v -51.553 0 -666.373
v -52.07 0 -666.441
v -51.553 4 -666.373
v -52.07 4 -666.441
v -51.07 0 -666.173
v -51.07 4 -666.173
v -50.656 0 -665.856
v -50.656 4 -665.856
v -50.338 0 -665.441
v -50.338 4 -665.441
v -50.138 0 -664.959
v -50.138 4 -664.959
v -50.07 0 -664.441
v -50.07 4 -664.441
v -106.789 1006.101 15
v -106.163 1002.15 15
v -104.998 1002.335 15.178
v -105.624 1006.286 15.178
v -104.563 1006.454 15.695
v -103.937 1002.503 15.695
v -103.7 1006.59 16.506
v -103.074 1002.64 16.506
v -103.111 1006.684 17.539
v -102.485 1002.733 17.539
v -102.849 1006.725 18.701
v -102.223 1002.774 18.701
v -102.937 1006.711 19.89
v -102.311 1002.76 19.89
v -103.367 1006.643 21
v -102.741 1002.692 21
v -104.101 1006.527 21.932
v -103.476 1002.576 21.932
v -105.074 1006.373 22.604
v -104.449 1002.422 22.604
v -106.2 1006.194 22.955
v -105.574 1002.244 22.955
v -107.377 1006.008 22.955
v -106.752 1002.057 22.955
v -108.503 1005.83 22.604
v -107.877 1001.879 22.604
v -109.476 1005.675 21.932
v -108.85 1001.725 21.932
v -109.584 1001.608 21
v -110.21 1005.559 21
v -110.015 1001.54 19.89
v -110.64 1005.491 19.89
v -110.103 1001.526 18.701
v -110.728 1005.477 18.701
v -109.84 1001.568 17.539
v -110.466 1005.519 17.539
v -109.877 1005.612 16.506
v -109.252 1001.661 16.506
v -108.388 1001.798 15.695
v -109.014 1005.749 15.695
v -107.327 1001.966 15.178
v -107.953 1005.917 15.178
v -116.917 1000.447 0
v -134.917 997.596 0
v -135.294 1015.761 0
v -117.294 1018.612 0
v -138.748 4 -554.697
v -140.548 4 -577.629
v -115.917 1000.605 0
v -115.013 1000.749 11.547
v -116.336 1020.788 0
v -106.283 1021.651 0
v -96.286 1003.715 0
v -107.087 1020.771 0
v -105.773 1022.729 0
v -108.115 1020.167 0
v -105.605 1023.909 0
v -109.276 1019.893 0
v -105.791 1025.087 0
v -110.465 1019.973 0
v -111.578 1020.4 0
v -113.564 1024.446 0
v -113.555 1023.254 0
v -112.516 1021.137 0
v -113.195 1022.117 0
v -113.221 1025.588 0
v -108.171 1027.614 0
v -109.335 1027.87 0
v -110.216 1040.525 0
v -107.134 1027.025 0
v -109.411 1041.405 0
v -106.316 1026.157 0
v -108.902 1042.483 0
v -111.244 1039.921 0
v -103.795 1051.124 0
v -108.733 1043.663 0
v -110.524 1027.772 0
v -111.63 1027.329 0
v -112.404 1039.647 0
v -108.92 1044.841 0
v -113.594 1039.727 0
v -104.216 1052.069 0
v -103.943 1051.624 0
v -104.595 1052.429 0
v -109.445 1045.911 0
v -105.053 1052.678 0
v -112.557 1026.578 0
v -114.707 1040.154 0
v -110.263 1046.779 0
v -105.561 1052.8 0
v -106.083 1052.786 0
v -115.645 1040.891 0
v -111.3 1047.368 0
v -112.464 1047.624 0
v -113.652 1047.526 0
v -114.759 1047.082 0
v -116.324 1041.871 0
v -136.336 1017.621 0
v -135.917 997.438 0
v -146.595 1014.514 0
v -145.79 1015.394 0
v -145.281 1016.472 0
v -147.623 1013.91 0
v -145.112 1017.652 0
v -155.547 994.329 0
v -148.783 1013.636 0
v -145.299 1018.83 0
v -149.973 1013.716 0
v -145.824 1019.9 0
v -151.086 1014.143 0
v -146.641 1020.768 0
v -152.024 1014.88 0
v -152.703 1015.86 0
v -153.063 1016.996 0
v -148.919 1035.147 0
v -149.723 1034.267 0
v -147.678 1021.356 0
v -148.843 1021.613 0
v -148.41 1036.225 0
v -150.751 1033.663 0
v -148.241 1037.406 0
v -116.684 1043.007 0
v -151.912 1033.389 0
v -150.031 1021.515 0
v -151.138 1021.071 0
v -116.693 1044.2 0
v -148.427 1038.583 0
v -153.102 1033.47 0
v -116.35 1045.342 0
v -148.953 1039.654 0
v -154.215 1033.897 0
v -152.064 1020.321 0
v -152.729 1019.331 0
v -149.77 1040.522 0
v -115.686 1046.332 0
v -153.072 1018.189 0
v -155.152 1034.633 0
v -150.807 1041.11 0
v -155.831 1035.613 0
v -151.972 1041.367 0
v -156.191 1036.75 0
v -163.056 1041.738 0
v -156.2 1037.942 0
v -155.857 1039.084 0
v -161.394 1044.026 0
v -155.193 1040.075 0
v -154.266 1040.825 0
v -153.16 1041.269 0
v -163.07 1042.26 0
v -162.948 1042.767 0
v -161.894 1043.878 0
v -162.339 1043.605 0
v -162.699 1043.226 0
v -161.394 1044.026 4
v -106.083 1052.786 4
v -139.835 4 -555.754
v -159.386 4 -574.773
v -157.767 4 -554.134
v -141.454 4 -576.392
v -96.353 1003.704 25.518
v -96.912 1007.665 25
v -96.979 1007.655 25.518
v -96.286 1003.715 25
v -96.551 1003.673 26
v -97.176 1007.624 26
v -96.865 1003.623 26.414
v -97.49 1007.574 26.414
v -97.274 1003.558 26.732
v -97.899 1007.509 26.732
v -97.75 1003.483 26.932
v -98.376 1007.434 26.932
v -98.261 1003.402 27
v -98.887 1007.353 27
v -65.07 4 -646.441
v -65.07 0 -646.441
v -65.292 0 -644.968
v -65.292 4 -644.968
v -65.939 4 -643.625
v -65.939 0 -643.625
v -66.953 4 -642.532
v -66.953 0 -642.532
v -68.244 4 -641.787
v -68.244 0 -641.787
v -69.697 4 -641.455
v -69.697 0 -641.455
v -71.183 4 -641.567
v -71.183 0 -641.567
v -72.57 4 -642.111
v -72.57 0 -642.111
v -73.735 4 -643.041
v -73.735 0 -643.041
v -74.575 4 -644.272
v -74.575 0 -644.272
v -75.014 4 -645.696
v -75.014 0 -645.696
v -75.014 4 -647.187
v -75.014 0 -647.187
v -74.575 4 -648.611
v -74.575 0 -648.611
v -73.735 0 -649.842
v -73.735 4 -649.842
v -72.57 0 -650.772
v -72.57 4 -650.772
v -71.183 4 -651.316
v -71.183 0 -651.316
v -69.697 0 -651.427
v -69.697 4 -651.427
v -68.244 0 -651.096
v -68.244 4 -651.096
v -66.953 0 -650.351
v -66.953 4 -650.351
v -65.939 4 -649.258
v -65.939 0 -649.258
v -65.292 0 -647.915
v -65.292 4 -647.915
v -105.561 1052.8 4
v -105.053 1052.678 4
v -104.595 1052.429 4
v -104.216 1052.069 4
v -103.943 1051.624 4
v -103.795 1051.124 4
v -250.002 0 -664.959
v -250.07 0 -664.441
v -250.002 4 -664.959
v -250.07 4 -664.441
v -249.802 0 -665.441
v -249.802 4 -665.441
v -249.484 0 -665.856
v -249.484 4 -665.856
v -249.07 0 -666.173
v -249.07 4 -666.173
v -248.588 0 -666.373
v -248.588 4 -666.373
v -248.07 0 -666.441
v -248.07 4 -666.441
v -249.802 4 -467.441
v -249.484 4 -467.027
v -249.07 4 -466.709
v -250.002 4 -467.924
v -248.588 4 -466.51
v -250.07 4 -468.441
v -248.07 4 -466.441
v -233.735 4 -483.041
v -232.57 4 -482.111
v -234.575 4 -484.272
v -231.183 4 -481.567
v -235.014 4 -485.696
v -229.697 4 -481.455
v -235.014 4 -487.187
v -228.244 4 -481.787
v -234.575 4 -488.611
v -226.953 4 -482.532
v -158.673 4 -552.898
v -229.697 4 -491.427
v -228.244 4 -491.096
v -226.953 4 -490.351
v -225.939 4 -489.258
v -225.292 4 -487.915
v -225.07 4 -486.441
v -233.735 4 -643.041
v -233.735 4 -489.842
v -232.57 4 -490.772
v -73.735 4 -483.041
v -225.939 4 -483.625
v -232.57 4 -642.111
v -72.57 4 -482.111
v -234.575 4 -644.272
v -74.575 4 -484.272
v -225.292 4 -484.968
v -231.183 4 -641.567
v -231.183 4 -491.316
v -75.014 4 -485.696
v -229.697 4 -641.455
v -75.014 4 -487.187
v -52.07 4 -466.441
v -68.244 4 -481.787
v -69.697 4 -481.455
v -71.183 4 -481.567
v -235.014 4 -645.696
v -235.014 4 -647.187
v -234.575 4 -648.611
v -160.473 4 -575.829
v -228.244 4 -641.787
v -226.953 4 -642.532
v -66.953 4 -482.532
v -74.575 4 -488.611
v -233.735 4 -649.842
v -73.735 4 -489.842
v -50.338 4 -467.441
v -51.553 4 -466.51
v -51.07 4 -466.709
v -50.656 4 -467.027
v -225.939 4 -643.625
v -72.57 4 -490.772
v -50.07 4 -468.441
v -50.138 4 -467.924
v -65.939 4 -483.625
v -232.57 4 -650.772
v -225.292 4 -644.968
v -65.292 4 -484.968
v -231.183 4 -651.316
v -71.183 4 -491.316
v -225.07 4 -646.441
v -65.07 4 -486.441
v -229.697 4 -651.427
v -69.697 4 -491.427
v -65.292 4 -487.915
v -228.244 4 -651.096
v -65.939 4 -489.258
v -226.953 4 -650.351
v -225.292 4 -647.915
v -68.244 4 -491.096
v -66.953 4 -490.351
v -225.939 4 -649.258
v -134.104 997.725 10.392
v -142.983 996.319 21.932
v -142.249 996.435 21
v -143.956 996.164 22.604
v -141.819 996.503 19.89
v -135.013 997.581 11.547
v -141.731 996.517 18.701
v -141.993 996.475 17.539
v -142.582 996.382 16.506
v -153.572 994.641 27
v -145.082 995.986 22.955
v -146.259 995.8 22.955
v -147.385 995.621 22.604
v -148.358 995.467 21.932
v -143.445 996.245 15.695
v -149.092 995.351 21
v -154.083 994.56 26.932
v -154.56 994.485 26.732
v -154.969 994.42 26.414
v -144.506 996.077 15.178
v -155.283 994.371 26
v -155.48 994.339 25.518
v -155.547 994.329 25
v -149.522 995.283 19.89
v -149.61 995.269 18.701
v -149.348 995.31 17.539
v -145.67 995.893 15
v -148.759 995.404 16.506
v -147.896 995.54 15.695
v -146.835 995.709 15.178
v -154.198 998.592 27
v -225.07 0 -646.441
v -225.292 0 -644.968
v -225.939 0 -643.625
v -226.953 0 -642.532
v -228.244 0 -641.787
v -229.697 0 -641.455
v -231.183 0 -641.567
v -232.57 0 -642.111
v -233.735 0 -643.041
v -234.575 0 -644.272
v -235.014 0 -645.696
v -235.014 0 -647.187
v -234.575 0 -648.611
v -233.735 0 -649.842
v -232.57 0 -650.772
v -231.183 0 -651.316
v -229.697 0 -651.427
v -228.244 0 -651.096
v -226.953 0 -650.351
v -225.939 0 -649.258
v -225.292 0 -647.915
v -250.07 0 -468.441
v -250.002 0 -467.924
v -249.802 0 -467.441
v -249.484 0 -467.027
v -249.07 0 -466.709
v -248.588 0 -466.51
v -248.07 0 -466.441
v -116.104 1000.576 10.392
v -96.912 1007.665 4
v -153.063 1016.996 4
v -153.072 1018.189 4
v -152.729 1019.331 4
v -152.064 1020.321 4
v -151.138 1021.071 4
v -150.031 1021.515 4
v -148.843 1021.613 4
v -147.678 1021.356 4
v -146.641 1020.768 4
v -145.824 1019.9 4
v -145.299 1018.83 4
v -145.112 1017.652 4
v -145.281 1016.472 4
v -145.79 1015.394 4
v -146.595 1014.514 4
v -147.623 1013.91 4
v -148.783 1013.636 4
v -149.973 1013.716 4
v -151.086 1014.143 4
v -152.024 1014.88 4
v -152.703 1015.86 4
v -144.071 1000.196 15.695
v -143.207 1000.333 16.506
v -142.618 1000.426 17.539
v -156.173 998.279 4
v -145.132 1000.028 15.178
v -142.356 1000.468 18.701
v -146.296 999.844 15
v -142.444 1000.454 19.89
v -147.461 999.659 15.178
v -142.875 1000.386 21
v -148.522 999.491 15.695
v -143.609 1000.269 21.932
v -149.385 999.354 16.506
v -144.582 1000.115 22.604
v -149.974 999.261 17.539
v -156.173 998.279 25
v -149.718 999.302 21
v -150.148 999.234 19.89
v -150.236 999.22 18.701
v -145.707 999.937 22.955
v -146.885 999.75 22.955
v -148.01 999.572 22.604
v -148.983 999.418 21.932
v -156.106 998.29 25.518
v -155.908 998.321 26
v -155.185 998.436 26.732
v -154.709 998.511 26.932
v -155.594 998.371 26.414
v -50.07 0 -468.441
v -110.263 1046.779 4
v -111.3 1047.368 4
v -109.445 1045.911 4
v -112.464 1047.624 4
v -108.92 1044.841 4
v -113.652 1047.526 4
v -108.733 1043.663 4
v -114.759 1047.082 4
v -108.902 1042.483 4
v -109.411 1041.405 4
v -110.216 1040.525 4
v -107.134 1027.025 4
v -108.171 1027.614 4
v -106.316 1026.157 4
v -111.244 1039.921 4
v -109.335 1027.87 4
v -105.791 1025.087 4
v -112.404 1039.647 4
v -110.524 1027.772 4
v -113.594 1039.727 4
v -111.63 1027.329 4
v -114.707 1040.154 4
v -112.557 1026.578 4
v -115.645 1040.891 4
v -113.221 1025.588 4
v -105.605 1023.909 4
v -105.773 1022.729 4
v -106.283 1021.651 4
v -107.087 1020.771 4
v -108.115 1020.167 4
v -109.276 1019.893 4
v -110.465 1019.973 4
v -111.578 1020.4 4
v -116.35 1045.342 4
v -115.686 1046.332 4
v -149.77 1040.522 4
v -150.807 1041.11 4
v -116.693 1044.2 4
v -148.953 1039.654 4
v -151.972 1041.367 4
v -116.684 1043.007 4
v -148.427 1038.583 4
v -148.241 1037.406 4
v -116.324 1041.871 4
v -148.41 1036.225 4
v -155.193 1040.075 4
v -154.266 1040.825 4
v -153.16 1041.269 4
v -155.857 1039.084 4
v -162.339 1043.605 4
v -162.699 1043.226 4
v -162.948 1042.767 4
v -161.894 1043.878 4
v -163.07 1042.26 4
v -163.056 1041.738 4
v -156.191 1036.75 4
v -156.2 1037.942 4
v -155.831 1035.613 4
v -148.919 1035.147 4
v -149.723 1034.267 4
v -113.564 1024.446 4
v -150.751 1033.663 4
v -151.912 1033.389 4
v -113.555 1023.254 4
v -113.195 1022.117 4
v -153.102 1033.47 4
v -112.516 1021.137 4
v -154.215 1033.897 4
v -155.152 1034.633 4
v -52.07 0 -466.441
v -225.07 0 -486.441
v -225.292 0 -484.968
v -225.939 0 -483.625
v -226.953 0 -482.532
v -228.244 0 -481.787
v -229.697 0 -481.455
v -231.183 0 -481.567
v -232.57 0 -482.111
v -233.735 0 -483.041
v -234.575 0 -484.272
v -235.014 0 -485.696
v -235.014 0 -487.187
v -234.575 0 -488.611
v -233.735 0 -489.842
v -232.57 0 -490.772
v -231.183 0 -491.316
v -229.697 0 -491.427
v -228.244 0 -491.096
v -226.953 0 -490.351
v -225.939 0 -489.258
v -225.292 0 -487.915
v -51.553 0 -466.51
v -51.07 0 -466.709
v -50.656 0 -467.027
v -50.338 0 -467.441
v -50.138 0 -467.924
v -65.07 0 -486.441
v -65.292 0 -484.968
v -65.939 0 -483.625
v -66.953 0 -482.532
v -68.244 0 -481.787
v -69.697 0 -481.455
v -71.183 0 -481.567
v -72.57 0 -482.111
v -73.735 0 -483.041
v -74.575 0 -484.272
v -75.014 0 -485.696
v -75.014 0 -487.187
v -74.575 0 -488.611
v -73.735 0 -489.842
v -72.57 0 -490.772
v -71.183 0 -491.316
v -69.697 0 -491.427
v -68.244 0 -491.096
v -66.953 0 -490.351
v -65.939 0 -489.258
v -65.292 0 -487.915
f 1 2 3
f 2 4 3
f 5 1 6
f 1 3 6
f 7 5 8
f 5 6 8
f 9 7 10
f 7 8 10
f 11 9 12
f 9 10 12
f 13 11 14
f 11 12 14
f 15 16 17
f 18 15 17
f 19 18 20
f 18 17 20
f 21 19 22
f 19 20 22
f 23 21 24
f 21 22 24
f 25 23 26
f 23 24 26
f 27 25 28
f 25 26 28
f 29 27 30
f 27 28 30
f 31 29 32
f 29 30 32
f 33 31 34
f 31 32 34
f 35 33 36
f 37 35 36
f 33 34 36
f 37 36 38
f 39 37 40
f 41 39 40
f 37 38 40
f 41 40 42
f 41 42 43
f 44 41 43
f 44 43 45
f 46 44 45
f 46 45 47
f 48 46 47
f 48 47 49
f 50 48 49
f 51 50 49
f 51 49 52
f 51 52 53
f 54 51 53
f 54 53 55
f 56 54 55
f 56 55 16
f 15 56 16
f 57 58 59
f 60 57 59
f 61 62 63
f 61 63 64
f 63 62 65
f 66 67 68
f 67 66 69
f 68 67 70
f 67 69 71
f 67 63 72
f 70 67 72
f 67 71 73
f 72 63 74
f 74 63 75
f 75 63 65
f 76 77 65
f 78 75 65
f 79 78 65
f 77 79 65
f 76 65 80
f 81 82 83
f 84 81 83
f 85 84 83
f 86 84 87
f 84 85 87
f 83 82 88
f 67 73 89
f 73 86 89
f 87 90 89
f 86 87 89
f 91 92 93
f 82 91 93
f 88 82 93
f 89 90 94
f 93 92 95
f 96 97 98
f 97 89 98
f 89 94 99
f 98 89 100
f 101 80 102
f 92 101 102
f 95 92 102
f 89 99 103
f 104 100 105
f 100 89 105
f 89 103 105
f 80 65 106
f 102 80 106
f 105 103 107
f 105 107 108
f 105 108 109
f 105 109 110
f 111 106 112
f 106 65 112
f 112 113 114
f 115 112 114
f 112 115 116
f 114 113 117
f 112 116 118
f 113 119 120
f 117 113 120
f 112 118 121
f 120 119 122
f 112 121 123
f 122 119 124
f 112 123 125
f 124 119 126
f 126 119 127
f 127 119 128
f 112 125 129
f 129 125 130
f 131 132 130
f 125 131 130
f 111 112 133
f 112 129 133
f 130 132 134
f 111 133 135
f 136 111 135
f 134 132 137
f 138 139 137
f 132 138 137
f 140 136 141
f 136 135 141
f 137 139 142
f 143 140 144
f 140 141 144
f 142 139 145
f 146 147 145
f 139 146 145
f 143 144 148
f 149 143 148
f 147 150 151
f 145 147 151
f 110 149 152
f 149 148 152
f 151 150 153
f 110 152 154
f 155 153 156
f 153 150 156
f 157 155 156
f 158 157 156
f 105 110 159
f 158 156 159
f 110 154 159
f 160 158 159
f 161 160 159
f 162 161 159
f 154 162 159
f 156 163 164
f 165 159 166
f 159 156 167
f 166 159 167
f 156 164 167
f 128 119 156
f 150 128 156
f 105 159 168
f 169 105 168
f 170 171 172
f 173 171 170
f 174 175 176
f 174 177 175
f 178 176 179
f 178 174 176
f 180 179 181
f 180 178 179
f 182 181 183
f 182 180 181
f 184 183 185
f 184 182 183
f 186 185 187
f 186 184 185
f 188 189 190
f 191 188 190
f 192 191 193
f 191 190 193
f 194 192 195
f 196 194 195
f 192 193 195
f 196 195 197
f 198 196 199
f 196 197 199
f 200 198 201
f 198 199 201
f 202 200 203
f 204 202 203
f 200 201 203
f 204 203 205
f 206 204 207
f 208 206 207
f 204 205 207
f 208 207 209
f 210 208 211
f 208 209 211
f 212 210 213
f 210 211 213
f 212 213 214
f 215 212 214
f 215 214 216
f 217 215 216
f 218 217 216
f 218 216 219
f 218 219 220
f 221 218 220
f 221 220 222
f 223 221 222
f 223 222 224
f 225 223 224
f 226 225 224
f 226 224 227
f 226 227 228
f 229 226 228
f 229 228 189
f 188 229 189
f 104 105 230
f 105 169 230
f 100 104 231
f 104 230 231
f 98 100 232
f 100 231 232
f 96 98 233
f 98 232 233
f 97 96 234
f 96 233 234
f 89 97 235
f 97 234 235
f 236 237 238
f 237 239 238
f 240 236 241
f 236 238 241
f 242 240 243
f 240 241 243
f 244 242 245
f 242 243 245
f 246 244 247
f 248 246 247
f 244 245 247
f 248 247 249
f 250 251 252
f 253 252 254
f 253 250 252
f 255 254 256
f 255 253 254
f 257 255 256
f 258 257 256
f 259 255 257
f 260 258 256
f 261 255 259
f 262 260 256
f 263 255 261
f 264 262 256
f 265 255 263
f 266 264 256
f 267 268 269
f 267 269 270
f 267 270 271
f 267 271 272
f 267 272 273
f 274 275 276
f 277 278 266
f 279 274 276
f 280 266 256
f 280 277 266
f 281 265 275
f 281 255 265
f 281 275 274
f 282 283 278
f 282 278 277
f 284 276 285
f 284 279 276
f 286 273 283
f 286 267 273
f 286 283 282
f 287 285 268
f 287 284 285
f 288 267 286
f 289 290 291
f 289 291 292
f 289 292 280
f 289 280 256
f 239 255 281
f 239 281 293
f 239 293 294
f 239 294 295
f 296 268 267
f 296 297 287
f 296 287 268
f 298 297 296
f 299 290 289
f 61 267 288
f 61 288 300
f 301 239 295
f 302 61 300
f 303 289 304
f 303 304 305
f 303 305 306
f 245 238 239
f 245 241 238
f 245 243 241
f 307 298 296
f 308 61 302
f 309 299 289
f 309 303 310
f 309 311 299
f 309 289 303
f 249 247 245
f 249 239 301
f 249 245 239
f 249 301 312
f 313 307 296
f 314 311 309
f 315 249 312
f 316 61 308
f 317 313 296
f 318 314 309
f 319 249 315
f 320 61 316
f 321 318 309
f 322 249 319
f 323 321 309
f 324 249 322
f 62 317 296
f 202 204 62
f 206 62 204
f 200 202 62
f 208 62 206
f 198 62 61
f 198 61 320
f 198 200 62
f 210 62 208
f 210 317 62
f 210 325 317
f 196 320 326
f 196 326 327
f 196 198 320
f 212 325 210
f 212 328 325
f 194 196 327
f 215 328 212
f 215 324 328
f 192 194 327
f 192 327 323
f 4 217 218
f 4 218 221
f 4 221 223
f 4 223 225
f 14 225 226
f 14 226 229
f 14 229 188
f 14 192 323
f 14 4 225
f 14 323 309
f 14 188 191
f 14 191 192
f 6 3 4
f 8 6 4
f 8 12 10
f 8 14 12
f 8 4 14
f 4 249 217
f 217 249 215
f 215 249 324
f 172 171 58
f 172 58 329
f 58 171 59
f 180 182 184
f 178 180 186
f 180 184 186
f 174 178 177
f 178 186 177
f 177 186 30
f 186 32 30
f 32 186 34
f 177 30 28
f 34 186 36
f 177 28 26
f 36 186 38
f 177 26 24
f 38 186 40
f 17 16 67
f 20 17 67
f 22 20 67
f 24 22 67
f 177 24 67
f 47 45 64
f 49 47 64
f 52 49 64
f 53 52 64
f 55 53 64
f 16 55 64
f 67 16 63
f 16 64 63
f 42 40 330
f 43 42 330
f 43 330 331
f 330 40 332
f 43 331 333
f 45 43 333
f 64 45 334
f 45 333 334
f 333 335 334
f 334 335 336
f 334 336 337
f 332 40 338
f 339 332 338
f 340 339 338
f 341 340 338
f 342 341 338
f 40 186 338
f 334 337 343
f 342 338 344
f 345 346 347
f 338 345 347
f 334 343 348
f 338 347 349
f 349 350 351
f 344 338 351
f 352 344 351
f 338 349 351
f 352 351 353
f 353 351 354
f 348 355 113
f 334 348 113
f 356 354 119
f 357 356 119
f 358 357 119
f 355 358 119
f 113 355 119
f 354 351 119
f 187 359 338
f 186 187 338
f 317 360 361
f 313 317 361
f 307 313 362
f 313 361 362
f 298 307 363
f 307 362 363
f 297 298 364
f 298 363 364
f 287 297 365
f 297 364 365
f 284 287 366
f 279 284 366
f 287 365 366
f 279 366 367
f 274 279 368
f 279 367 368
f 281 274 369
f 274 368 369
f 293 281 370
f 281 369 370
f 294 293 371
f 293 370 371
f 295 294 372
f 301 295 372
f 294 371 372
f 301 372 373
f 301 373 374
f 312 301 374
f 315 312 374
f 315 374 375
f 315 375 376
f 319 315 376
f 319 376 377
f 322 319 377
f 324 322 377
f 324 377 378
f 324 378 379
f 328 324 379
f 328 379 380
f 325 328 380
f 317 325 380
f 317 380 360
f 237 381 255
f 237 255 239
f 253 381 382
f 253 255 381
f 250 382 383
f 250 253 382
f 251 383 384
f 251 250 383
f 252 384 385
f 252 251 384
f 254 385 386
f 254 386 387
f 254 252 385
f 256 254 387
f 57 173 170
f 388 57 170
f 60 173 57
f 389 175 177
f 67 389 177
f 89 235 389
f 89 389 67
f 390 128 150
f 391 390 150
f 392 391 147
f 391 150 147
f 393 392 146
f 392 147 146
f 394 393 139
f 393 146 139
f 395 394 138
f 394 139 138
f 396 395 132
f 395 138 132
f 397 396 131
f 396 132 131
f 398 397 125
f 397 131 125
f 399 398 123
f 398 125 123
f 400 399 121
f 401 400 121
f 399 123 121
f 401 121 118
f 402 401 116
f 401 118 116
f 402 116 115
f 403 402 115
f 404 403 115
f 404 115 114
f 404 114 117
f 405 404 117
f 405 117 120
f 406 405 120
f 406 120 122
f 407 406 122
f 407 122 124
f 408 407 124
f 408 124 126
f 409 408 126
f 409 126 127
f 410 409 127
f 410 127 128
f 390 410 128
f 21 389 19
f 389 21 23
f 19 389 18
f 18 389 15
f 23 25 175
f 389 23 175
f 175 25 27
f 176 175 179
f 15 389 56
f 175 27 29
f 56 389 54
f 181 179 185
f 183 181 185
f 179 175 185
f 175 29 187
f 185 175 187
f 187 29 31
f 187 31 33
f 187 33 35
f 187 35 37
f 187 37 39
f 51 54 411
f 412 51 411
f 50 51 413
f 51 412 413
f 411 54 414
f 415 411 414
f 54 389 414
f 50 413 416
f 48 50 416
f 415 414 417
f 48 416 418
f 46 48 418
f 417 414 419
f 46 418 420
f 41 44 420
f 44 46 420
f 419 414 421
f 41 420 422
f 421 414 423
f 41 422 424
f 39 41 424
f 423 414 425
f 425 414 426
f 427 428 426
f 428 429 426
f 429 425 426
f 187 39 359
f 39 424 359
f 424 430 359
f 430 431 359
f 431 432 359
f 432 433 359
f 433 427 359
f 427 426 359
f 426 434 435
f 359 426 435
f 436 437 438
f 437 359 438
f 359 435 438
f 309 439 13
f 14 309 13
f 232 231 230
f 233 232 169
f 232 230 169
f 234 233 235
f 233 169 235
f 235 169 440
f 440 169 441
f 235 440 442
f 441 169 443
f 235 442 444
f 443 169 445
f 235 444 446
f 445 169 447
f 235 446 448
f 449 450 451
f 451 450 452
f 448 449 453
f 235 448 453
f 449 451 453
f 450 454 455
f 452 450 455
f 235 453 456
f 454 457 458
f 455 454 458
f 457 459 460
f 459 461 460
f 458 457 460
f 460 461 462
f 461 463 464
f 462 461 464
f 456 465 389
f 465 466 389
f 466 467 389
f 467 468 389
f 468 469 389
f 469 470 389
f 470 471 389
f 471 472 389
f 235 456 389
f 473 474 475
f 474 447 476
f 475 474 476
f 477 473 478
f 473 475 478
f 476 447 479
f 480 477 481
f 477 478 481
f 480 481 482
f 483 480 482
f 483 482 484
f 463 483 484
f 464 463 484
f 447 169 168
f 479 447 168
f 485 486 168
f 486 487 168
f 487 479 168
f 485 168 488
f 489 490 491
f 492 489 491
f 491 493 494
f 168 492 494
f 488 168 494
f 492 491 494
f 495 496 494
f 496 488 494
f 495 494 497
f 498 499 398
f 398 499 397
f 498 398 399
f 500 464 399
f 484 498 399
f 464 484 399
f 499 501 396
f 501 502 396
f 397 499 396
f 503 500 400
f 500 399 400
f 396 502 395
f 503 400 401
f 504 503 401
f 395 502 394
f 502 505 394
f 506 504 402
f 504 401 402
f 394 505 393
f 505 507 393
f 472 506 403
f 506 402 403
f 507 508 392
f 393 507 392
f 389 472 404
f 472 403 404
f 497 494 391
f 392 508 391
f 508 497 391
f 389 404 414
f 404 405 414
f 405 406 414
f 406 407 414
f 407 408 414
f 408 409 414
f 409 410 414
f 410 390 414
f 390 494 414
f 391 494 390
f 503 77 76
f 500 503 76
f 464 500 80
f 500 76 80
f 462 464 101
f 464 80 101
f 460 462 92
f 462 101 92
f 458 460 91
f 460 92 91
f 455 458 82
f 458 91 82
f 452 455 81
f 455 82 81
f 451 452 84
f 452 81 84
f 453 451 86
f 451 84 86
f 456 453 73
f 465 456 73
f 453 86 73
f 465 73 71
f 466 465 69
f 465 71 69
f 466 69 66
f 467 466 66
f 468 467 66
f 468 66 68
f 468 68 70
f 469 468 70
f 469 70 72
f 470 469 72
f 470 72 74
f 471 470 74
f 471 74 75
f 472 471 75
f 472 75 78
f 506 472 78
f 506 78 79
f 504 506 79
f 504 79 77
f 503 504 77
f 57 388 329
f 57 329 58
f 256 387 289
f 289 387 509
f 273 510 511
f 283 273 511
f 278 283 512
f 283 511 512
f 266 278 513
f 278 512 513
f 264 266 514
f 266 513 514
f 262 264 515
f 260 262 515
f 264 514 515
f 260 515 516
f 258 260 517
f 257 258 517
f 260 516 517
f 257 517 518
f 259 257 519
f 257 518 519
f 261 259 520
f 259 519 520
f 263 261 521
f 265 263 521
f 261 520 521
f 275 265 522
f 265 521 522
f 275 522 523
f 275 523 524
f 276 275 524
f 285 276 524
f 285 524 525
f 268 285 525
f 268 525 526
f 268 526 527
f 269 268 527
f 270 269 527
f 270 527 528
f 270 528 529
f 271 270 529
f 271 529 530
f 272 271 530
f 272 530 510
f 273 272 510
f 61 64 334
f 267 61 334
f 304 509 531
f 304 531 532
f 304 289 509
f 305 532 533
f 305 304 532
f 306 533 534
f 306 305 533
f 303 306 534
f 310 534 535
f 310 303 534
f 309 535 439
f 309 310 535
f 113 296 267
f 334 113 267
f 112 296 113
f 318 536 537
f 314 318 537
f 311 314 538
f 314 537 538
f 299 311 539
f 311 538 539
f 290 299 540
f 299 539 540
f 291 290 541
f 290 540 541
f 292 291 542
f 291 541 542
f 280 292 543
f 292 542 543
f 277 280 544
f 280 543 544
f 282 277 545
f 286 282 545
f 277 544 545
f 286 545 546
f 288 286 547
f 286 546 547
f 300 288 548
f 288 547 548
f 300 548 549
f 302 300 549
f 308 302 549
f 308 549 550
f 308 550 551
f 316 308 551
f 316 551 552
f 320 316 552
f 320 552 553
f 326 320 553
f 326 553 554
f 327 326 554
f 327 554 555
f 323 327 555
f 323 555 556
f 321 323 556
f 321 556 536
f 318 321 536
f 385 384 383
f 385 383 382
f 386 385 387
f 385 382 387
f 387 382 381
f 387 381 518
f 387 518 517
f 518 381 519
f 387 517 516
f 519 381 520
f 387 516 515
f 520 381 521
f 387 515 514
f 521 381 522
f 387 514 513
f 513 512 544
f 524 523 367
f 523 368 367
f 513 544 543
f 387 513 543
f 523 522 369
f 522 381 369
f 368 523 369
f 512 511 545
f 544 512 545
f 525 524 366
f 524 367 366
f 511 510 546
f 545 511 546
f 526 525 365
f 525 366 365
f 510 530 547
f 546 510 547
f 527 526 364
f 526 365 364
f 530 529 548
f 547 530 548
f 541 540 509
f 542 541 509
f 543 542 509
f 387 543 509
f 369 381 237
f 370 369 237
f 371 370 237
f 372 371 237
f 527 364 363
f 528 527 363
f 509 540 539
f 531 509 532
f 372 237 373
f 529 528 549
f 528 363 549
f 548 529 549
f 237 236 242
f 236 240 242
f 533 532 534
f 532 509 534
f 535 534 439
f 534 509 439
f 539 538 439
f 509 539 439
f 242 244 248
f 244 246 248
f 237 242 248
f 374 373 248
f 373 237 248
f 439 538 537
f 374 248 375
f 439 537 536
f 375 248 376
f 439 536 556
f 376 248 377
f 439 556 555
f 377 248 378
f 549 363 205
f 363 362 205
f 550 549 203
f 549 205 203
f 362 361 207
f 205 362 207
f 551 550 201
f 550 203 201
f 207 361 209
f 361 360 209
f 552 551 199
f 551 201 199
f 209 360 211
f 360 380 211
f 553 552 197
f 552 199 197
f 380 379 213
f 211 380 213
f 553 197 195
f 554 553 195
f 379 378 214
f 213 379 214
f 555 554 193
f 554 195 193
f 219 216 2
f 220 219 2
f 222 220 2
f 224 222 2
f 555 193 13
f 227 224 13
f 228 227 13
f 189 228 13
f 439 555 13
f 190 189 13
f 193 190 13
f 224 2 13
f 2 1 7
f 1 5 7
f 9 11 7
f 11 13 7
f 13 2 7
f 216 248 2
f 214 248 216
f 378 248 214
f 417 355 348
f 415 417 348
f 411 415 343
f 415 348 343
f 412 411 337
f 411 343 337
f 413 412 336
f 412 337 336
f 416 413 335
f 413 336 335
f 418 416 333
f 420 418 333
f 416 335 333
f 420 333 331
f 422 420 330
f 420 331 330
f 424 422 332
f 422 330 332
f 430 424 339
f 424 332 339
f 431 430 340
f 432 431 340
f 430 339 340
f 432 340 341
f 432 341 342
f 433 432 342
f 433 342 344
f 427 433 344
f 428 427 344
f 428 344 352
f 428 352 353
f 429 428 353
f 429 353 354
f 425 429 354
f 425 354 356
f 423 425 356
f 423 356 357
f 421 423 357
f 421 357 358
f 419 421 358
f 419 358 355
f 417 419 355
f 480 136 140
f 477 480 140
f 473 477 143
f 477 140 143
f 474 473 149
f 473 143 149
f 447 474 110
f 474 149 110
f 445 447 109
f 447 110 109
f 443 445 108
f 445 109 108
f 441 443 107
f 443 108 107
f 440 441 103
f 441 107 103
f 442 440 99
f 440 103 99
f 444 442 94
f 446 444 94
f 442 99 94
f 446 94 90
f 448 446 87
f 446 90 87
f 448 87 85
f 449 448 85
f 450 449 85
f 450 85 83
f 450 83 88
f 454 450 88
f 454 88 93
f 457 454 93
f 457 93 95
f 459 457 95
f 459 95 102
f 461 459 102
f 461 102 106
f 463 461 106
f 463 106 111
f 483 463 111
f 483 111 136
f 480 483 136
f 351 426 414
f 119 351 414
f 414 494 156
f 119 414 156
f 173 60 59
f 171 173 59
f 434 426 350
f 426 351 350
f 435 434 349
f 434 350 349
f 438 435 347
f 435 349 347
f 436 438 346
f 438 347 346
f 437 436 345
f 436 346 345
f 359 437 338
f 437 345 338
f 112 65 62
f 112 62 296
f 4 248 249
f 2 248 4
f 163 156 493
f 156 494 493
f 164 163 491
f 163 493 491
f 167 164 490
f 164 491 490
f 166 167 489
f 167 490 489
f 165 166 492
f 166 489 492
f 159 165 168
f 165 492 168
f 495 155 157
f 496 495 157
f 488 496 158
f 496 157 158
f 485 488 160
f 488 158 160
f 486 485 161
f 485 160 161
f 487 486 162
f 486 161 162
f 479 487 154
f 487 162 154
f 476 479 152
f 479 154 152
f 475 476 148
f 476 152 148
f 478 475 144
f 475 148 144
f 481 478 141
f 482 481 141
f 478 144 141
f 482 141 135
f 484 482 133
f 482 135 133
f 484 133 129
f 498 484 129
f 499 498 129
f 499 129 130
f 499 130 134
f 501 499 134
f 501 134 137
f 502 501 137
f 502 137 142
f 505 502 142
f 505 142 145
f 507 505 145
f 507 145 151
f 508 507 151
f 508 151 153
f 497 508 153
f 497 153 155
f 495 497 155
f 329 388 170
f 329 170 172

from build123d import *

# Parameters (mm, degrees)
BOSS_EXTRUDE1_DEPTH      = 60
BOSS_EXTRUDE2_DEPTH      = 2000
BOSS_EXTRUDE2_DEPTH_BACK = 20
SKETCH3_W                = 20
SKETCH3_H                = 20
SKETCH3_W_2              = 18
SKETCH3_H_2              = 18
CUT_EXTRUDE1_DEPTH       = 60
SKETCH7_W                = 200
SKETCH7_H                = 200
BOSS_EXTRUDE3_DEPTH      = 4
SKETCH8_W                = 109.20231627
SKETCH8_H                = 482.966945154
CUT_EXTRUDE3_DEPTH       = 1000
CUT_EXTRUDE4_REACH       = 1228.081
SKETCH9_R                = 3.999999996
CUT_EXTRUDE5_REACH       = 1228.081
SKETCH10_R               = 4.000000003
CUT_EXTRUDE6_REACH       = 1249.32
SKETCH11_R               = 5
FILLET1_R                = 2
FILLET2_R                = 2
BODY_MOVE_COPY1_ANGLE    = 9


with BuildPart() as part:
    # Sketch1 → Boss-Extrude1 (new body)
    with BuildSketch(Plane(origin=(0, 0, 0), x_dir=(0, 0, -1), z_dir=(1, 0, 0))):
        Polygon((0, 0), (0, 50), (-4, 50), (-4, 4), (-27, 4), (-27, 0), align=None)
    extrude(amount=BOSS_EXTRUDE1_DEPTH)

    # Sketch3 → Boss-Extrude2 (add, two sides: drawn at the far end of the back side and taken through both)
    with BuildSketch(Plane(origin=(0.734152256, 4.01424851, 2.317627458), x_dir=(0, -0.49999999999998884, 0.866025403784445), z_dir=(-0.1564344650402179, -0.8553631939770945, -0.4938441702975589)).offset(-BOSS_EXTRUDE2_DEPTH_BACK)):
        with Locations((0, -29.630650218)):
            Rectangle(SKETCH3_W, SKETCH3_H)
        with Locations((0, -29.630650218)):
            Rectangle(SKETCH3_W_2, SKETCH3_H_2, mode=Mode.SUBTRACT)
    extrude(amount=BOSS_EXTRUDE2_DEPTH + BOSS_EXTRUDE2_DEPTH_BACK)

    # Sketch5 → Cut-Extrude1 (cut)
    with BuildSketch(Plane.ZY):
        Polygon((4, 4), (4, 36.054903459), (38.781358344, 4), align=None)
    extrude(amount=-CUT_EXTRUDE1_DEPTH, mode=Mode.SUBTRACT)

    # Sketch7 → Boss-Extrude3 (add)
    with BuildSketch(Plane(origin=(-155.547262091, -982.086761679, 2e-09), x_dir=(0.9876883405962854, -0.15643446503298483, 2.850074130140158e-13), z_dir=(0.15643446503298483, 0.9876883405962854, -1.7994659856963007e-12))):
        with Locations((5.477031178, 566.441418592)):
            Rectangle(SKETCH7_W, SKETCH7_H)
    extrude(amount=BOSS_EXTRUDE3_DEPTH)

    # Sketch8 → Cut-Extrude3 (cut)
    with BuildSketch(Plane(origin=(-155.547262091, -982.086761679, 2e-09), x_dir=(0.9876883405962856, -0.15643446503298414, -2.6345368338963644e-10), z_dir=(-0.15643446503298414, -0.9876883405962856, 1.799719805411024e-12))):
        with Locations((4.33544583, -787.065663544)):
            Rectangle(SKETCH8_W, SKETCH8_H)
    extrude(amount=CUT_EXTRUDE3_DEPTH, mode=Mode.SUBTRACT)

    # Sketch9 → Cut-Extrude4 (cut, up to next)
    with BuildSketch(Plane(origin=(0, 0, 0), x_dir=(-1, 0, 0), z_dir=(0, 0, -1)), mode=Mode.PRIVATE) as cut_extrude4_sk1:
        with Locations((-50, 22)):
            Circle(SKETCH9_R)
    cut_extrude4_tool1 = extrude(cut_extrude4_sk1.sketch, amount=-CUT_EXTRUDE4_REACH, mode=Mode.PRIVATE) & part.part
    # Sketch9 → Cut-Extrude4 (cut, up to next)
    with BuildSketch(Plane(origin=(0, 0, 0), x_dir=(-1, 0, 0), z_dir=(0, 0, -1)), mode=Mode.PRIVATE) as cut_extrude4_sk2:
        with Locations((-10, 22)):
            Circle(SKETCH9_R)
    cut_extrude4_tool2 = extrude(cut_extrude4_sk2.sketch, amount=-CUT_EXTRUDE4_REACH, mode=Mode.PRIVATE) & part.part
    # Sketch9 → Cut-Extrude4 (cut, up to next)
    with BuildSketch(Plane(origin=(0, 0, 0), x_dir=(-1, 0, 0), z_dir=(0, 0, -1)), mode=Mode.PRIVATE) as cut_extrude4_sk3:
        with Locations((-10, 42)):
            Circle(SKETCH9_R)
    cut_extrude4_tool3 = extrude(cut_extrude4_sk3.sketch, amount=-CUT_EXTRUDE4_REACH, mode=Mode.PRIVATE) & part.part
    # Sketch9 → Cut-Extrude4 (cut, up to next)
    with BuildSketch(Plane(origin=(0, 0, 0), x_dir=(-1, 0, 0), z_dir=(0, 0, -1)), mode=Mode.PRIVATE) as cut_extrude4_sk4:
        with Locations((-50, 42)):
            Circle(SKETCH9_R)
    cut_extrude4_tool4 = extrude(cut_extrude4_sk4.sketch, amount=-CUT_EXTRUDE4_REACH, mode=Mode.PRIVATE) & part.part
    add(cut_extrude4_tool1.solids().sort_by_distance((50, 22, 0))[0], mode=Mode.SUBTRACT)
    add(cut_extrude4_tool2.solids().sort_by_distance((10, 22, 0))[0], mode=Mode.SUBTRACT)
    add(cut_extrude4_tool3.solids().sort_by_distance((10, 42, 0))[0], mode=Mode.SUBTRACT)
    add(cut_extrude4_tool4.solids().sort_by_distance((50, 42, 0))[0], mode=Mode.SUBTRACT)

    # Sketch10 → Cut-Extrude5 (cut, up to next)
    with BuildSketch(Plane.XZ, mode=Mode.PRIVATE) as cut_extrude5_sk1:
        with Locations(Location((50, 19, 0), (0, 0, 270))):
            Circle(SKETCH10_R)
    cut_extrude5_tool1 = extrude(cut_extrude5_sk1.sketch, amount=-CUT_EXTRUDE5_REACH, mode=Mode.PRIVATE) & part.part
    # Sketch10 → Cut-Extrude5 (cut, up to next)
    with BuildSketch(Plane.XZ, mode=Mode.PRIVATE) as cut_extrude5_sk2:
        with Locations(Location((10, 19, 0), (0, 0, 270))):
            Circle(SKETCH10_R)
    cut_extrude5_tool2 = extrude(cut_extrude5_sk2.sketch, amount=-CUT_EXTRUDE5_REACH, mode=Mode.PRIVATE) & part.part
    add(cut_extrude5_tool1.solids().sort_by_distance((50, 0, 19))[0], mode=Mode.SUBTRACT)
    add(cut_extrude5_tool2.solids().sort_by_distance((10, 0, 19))[0], mode=Mode.SUBTRACT)

    # Sketch11 → Cut-Extrude6 (cut, up to next)
    with BuildSketch(Plane(origin=(-155.547262091, -982.086761679, 2e-09), x_dir=(0.9876883405962856, -0.15643446503298414, -2.6345368338963665e-10), z_dir=(-0.15643446503298414, -0.9876883405962856, 1.7997198054110692e-12)), mode=Mode.PRIVATE) as cut_extrude6_sk1:
        with Locations((-74.522968646, -486.441418617)):
            Circle(SKETCH11_R)
    cut_extrude6_tool1 = extrude(cut_extrude6_sk1.sketch, amount=-CUT_EXTRUDE6_REACH, mode=Mode.PRIVATE) & part.part
    # Sketch11 → Cut-Extrude6 (cut, up to next)
    with BuildSketch(Plane(origin=(-155.547262091, -982.086761679, 2e-09), x_dir=(0.9876883405962856, -0.15643446503298414, -2.6345368338963665e-10), z_dir=(-0.15643446503298414, -0.9876883405962856, 1.7997198054110692e-12)), mode=Mode.PRIVATE) as cut_extrude6_sk2:
        with Locations((85.477031354, -486.441418617)):
            Circle(SKETCH11_R)
    cut_extrude6_tool2 = extrude(cut_extrude6_sk2.sketch, amount=-CUT_EXTRUDE6_REACH, mode=Mode.PRIVATE) & part.part
    # Sketch11 → Cut-Extrude6 (cut, up to next)
    with BuildSketch(Plane(origin=(-155.547262091, -982.086761679, 2e-09), x_dir=(0.9876883405962856, -0.15643446503298414, -2.6345368338963665e-10), z_dir=(-0.15643446503298414, -0.9876883405962856, 1.7997198054110692e-12)), mode=Mode.PRIVATE) as cut_extrude6_sk3:
        with Locations((85.477031354, -646.441418617)):
            Circle(SKETCH11_R)
    cut_extrude6_tool3 = extrude(cut_extrude6_sk3.sketch, amount=-CUT_EXTRUDE6_REACH, mode=Mode.PRIVATE) & part.part
    # Sketch11 → Cut-Extrude6 (cut, up to next)
    with BuildSketch(Plane(origin=(-155.547262091, -982.086761679, 2e-09), x_dir=(0.9876883405962856, -0.15643446503298414, -2.6345368338963665e-10), z_dir=(-0.15643446503298414, -0.9876883405962856, 1.7997198054110692e-12)), mode=Mode.PRIVATE) as cut_extrude6_sk4:
        with Locations((-74.522968646, -646.441418617)):
            Circle(SKETCH11_R)
    cut_extrude6_tool4 = extrude(cut_extrude6_sk4.sketch, amount=-CUT_EXTRUDE6_REACH, mode=Mode.PRIVATE) & part.part
    add(cut_extrude6_tool1.solids().sort_by_distance((-229.152729, -970.428801, -486.441419))[0], mode=Mode.SUBTRACT)
    add(cut_extrude6_tool2.solids().sort_by_distance((-71.122595, -995.458315, -486.441419))[0], mode=Mode.SUBTRACT)
    add(cut_extrude6_tool3.solids().sort_by_distance((-71.122595, -995.458315, -646.441419))[0], mode=Mode.SUBTRACT)
    add(cut_extrude6_tool4.solids().sort_by_distance((-229.152729, -970.428801, -646.441419))[0], mode=Mode.SUBTRACT)

    # Fillet1
    fillet1_edges = [part.edges().sort_by_distance(p)[0] for p in [
        (60, 50, 2),
        (60, 2, 27),
        (0, 2, 27),
        (0, 50, 2),
    ]]
    fillet(fillet1_edges, radius=FILLET1_R)

    # Fillet2
    fillet2_edges = [part.edges().sort_by_distance(p)[0] for p in [
        (-248.593627385, -965.324734939, -666.44141859),
        (-248.593627385, -965.324734938, -466.44141859),
        (-51.055959266, -996.611627945, -466.44141859),
        (-51.055959266, -996.611627945, -666.44141859),
    ]]
    fillet(fillet2_edges, radius=FILLET2_R)


with BuildPart() as part_1:
    # Body-Move/Copy1: read off the stored shape, not the designer's step
    # Body-Move/Copy1: moved
    add(part.part.moved(Location((1.9150449, 1006.4197144, 0))).rotate(Axis((0, 0, 0), (0, 0, 1)), BODY_MOVE_COPY1_ANGLE))


solid = part_1.part
